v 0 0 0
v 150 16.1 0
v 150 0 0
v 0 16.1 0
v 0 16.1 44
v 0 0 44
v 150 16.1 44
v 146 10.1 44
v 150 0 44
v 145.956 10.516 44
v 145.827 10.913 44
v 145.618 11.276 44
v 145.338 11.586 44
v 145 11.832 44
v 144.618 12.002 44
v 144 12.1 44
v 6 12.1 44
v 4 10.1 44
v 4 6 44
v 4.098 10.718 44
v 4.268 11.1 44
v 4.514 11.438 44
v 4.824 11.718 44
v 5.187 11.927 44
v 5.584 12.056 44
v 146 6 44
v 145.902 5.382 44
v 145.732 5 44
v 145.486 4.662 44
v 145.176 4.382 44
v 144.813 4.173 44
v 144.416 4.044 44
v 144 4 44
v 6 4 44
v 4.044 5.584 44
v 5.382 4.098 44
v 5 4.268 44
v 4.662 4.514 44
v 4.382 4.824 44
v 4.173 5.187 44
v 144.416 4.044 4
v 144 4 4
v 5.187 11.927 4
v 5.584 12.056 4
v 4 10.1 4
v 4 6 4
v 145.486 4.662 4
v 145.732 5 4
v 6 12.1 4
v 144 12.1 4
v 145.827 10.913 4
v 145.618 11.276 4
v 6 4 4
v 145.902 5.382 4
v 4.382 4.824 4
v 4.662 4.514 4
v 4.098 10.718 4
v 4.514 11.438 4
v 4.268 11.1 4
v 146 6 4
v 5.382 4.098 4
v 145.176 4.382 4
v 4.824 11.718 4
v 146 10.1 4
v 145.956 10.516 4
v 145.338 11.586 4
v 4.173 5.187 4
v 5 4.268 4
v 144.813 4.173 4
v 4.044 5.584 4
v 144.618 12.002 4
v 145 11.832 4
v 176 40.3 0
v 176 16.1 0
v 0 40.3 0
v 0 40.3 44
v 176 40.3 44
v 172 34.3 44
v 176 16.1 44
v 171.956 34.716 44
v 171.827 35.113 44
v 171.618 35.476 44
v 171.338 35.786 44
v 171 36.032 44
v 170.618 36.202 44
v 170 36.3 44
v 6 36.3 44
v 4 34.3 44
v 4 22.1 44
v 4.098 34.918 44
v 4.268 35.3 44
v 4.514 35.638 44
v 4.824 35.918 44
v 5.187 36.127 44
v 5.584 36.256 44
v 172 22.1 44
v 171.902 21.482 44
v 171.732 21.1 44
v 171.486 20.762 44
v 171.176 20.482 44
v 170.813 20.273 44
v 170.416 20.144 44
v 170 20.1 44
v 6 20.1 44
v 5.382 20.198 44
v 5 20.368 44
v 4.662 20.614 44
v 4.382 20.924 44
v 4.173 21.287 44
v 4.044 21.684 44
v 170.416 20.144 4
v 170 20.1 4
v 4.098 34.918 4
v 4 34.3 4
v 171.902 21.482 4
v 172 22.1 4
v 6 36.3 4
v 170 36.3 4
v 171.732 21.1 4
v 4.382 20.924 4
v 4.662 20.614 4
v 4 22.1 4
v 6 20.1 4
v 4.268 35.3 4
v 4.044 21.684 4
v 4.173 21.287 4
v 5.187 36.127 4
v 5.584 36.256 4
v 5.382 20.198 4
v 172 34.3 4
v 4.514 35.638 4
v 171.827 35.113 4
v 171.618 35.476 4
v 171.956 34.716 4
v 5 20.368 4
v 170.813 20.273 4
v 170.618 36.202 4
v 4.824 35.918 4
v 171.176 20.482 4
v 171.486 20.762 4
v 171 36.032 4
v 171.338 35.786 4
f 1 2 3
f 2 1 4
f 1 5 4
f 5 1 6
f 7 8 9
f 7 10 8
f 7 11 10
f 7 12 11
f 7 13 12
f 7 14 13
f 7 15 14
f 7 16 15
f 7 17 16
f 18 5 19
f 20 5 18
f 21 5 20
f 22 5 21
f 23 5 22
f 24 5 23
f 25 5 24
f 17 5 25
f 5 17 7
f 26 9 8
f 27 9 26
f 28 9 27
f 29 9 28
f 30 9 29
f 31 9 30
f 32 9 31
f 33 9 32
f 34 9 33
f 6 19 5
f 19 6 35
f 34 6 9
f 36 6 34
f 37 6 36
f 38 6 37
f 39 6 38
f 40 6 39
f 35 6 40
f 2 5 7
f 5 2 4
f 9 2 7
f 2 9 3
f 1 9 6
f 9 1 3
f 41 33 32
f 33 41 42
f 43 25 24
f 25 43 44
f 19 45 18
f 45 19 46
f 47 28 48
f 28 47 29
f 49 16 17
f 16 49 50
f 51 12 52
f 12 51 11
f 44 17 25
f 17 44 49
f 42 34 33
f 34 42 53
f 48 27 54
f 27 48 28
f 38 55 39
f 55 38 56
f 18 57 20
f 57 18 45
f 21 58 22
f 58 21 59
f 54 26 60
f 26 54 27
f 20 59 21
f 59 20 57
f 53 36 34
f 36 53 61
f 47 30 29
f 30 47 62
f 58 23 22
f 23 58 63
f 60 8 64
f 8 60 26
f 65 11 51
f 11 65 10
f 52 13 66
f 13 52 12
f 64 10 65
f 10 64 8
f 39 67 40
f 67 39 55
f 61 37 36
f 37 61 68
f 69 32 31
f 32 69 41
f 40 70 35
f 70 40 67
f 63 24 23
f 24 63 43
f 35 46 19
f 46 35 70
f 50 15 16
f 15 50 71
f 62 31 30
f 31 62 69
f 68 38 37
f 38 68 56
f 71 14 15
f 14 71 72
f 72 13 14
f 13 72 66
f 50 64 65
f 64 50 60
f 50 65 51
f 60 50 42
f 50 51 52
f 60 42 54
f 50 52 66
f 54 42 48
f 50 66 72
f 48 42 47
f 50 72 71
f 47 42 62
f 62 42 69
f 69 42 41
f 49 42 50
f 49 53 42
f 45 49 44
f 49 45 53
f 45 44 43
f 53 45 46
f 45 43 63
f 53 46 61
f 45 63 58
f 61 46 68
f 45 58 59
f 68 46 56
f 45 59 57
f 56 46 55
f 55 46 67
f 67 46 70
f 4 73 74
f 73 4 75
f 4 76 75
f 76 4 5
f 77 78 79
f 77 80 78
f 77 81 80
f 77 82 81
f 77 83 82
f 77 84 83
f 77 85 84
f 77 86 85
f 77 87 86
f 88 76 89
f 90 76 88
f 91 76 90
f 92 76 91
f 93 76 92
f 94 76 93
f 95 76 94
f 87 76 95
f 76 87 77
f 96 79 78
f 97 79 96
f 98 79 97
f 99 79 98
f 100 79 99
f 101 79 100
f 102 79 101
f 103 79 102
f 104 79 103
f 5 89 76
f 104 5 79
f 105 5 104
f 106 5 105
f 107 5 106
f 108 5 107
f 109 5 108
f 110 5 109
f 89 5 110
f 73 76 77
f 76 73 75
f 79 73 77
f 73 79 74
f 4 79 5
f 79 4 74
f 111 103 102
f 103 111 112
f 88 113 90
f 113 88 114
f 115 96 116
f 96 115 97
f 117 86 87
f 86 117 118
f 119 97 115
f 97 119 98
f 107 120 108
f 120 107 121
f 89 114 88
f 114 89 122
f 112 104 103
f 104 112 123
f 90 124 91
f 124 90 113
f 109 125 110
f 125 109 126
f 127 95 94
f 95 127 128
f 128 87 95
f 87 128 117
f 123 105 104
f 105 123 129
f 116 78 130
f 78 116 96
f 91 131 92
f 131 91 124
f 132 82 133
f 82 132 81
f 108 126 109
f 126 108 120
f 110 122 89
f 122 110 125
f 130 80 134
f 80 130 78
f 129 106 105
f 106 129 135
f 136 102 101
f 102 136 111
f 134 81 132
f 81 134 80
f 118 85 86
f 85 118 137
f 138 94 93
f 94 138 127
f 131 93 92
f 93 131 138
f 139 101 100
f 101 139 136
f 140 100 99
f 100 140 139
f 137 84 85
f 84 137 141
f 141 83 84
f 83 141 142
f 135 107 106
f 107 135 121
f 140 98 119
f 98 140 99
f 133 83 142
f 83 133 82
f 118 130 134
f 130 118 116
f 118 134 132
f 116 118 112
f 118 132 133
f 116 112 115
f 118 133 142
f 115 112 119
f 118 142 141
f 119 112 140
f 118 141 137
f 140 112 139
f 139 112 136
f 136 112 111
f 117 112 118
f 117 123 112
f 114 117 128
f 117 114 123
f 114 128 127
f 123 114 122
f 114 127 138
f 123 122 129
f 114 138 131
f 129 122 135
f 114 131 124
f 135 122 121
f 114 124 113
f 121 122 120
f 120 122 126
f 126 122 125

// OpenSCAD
// file: myTools.scad
module tube (r = 0, d = 0, l = 0, 
            thick = 0, 
            bCentered = true, 
            taper_pct = 0, 
            circlip = false) // r=radius d=dia l=length 
{
    assert( r != 0 || d != 0, "specify one of radius or diameter");
    assert( l != 0 , "tube: need length 'l' to be non zero");
    assert( thick != 0, "wall thickness cannot be zero");

    punch = $preview ? .2 : 0; // stop funny view artifact

    dia = r ? r * 2 : d;

    od = ((thick > 0) ? dia + thick * 2 : dia);
    id = (thick > 0) ? dia             : dia  + thick *2; 

    
    
    if (thick > 0)
        echo ("tube\tMIN id = ", id, "od = ", od, "wall = ", thick, "center= ", bCentered);
    else
        echo ("tube\tMAX od = ", od, "id = ", id, "wall = ", thick, "center= ", bCentered);

    echo ("tube\tHeigth = ", l);
        
    if (taper_pct != 0)
    {
        echo ("tube\t*** OD expanded by ", taper_pct, "%, : bottom od = ", od * (1. +taper_pct/100), "top od = ", od);
    }
    
    assert(dia || dia < 0, "tube : missing r or d ");
    
    // if taper_pct specified, the base will always be closest to 0,0,0
    translate([ 0, 0, taper_pct == 0 ? 0: bCentered ? l/2:l  ])
    rotate([0, taper_pct == 0 ? 0 : 180, 0 ])

    difference()
    {
        // make a reese's cup
        {
            color("YELLOW", .3)
            linear_extrude(height= l, scale = 1 + taper_pct/100)
                difference()
                {
                    circle(d = od);
                    circle(d = .5);
                }
        }
    
     // hollow out reessed cup
     color("GREEN")
     translate([0, 0, -punch/2])
     linear_extrude(height= l+ punch*2, $fn=100)
     {
        circle(d = id);
        if (circlip) #square([1 + punch, od ]);
     }
    
    }
}
//==============================================================================
        
module abox (dims, 
            thick = 0, 
            bCentered = true, 
            round_out = 0, 
            round_in = 0, 
            bSolid = false,
            bHollow = false,
            elevator = 0)   // move bottom up by X
{
    punch = $preview ? .1 : 0; // stop funny view artifact
    
    assert(thick != 0, "Thick must be specified. +=outside dim, -= inside dims");
    assert(dims.z > thick, "wall thickness too large for depth of box");

    wall2 = abs(thick) * 2; // 2 walls in each direction
    wall = wall2 / 2;
    
    // box either grows inward (thick < 0) or outward (thick > 0)  from dims
    fat = dims + [ wall2, wall2, wall];
    thin = dims - [ wall2, wall2, wall];
    
    offset = (thick > 0 && bCentered == false) ? wall : 0;
    
    //echo ("abox : adjusting x,y,z by ", offset, " to move origin from  center to 0,0,0");
    translate( [ bCentered ? 0 : dims.x /2 + offset, bCentered ? 0 : dims.y /2 + offset, bCentered ? 0 : dims.z /2 + offset/2]) 
    {
        if (thick > 0)
        {   
            // wall grows outwards from users dim
            echo ("making a box, MAX INSIDE dim = ", dims);
            echo ("   wall=", thick, " mm");
            echo ("   calc outside = ", fat, " mm");
        }
        else
        {
            // wall grows inward from users dime
            echo ("making a box, MAX OUTSIDE dim = ", dims);
            echo ("    wall=", thick, "mm");
            echo ("    calc inside = ", thin, " mm");
        }
        echo (" ");
        
        // linear extrude alway works in the positive x/y plane an goes upward.
        // after calc, re-center about 0,0,0 where a bCentered cube would be
        
        translate([ 0, 0, thick > 0  ? -fat.z/2 : -dims.z/2 ])
        difference()
        {
            echo ("round_out = ", round_out);

            // MAKE SOLID BOX --------------------------------------
            router_outside = round_out ? round_out : 0;
            x = thick > 0  ? fat.x - router_outside : dims.x - router_outside;
            y = thick > 0  ? fat.y - router_outside : dims.y - router_outside;


            // MAKE PUCHNED INSIDE
            // using 'offset' it will add r on all dimensions, then round., 
            // so now you have fatter perimeter than you started with :(
            //  but at least the corners are round.
            
            // Compensate by shrinking dimension by r, 
            // and then by calling offset, offset will then add it back

            //color("YELLOW", .2)

            // ready height 
            linear_extrude(thick > 0  ? fat.z : dims.z)
            if (round_out)
            {
                offset( r= round_out, $fn=30)
                square( [x - router_outside, y - router_outside], true);
            }
            else
            {
                // no rounding on outside dims.
                square( [x, y], true);
            }
            // time to punch out the inside if requested.
            if (bSolid == false)
            {
                hollow_offset = bHollow ? fat.z/2 + .2  : dims.z/2 +.2;
                // punching out inside. its either dims or thin.
                router_inside = round_in;
                echo ("round_in = ", router_inside);
                xi = thick > 0  ? dims.x  : thin.x;
                yi = thick > 0  ? dims.y : thin.y ;

                color("GREEN")

                // move 'punch' up if you need a bottom else zero (hollowed out)

                translate([ 0,0, bHollow ? -.1 : wall + elevator]) 
                linear_extrude(thick > 0  ? fat.z - wall  + hollow_offset : dims.z - wall + hollow_offset)
                //#linear_extrude(fat.z - wall  + hollow_offset)
                
                if (round_in) 
                {
                    offset( r= round_in, $fn=30)
                    square( [ xi - round_in*2, yi - round_in*2], true);
                }
                else
                    square( [ xi, yi], true);
            }
        }
    }
 }
//-----------------------------------------------------
module abox_punch (dims, 
            thick = 0, 
            bCentered = true, 
            round_out = 0, 
            round_in = 0, 
            bSolid = false,
            bHollow = false,
            elevator = 0)   // move bottom up by X
{
    // move bottom down by wall thickness to blow out bottom
    abox(dims, thick, bCentered,
         round_out, round_in, bSolid = false, 
         bHollow=true, elevator = -thick);
}



// 50x25x10 box walls grow inward (-2). on center origin midpoint
// rounded outside (default), sharp corner inside(default), bCentered about 0,0,0
//color("GREEN", .9)
//abox([50,25, 10], -2, true); 


// 50x25x10 box walls grow outward (+2). on center origin midpoint
// sharp outside corners, rounded inside corners. Sit on x,y plane
color("BLUE", .9)
abox([50,20, 10], +2, round_in=2, bCentered = false);  // 50x25x10 box inside dim origin has 0,0


// 50x25x10 box walls grow inward (-2). on center origin midpoint
// sharp corners inside and out. sits on x,y plane
color("GREY", .9)//
translate([ 55, 0, 0])      
abox([50,20, 10], +2, round_out=3, false);

color("PINK", .9)//
translate([ 55 * 2, 0, 0])      
abox_punch([50,20, 10], +2, round_out=3, false);

color("GREEN", .9)//
translate([ 55 * 3, 0, 0])      
abox_punch([50,20, 10], +2, round_in=2, false);


color("CYAN", .9)//
translate([ 55 * 4, 0, 0])      
abox_punch([50,20, 10], +2, round_in=2, round_out=2, false);


/*
color("GREEN", .9)//
translate([ 140, 10, -10])      
abox([86.66, 56.865, 5], 3, bHollow = true, bCentered = false); 
*/

/*
// 50x25x10 box walls grow inward (-2). on center origin midpoint
// round corners outside and SOLID
color("BLUE", .9)//
translate([ 55, 0, 0])      
abox([50,25, 10], +2, round_out=2, round_in=0, false, bSolid = true); // 50x25x10 box outside dim origin is 0,0
*/

//translate ([-30,-30, 0])
{
/*
    // tube outer dia  20, inner dia = (20 - 8)
    color("PINK")
    tube (d = 20, l = 20, thick = -8, bCentered = false);

    // tube, inner dia = (2* 10), outer dia = ((2*10) + 2) 
    color("PURPLE", .3)
    tube (r = 10, l = 20, thick = +2, bCentered= true);
*/
/*
    tube (d = 60, l = 20, thick = -6, bCentered = false);

    translate([0, 0, 50])
    tube (d = 60, l = 20, thick = -6, bCentered = false, taper_pct = 20, circlip = true);
    //color("GREEN")
    //tube (d = 20, l = 20, thick = -2, bCentered = false, taper = 10, circlip = true);
*/

}
// main file
use <myTools.scad>

phone6= [ 138, 7.1, 40 ];
tweak = [ 4, 1, 0 ];

phone8 = [ 142+ 22, 15.20, 40 ];

Xphone6 = phone6 + tweak;
Xphone8 = phone8 + tweak;

WALL=4;

color("BLUE", .9)
abox( Xphone6, +WALL, round_in=2, bCentered = false);  // 50x25x10 box inside dim origin has 0,0
translate([ 0, Xphone6.y + WALL*2 , 0 ])
color("RED", .9)
abox( Xphone8, +WALL, round_in=2, bCentered = false);  // 50x25x10 box inside dim origin has 0,0
